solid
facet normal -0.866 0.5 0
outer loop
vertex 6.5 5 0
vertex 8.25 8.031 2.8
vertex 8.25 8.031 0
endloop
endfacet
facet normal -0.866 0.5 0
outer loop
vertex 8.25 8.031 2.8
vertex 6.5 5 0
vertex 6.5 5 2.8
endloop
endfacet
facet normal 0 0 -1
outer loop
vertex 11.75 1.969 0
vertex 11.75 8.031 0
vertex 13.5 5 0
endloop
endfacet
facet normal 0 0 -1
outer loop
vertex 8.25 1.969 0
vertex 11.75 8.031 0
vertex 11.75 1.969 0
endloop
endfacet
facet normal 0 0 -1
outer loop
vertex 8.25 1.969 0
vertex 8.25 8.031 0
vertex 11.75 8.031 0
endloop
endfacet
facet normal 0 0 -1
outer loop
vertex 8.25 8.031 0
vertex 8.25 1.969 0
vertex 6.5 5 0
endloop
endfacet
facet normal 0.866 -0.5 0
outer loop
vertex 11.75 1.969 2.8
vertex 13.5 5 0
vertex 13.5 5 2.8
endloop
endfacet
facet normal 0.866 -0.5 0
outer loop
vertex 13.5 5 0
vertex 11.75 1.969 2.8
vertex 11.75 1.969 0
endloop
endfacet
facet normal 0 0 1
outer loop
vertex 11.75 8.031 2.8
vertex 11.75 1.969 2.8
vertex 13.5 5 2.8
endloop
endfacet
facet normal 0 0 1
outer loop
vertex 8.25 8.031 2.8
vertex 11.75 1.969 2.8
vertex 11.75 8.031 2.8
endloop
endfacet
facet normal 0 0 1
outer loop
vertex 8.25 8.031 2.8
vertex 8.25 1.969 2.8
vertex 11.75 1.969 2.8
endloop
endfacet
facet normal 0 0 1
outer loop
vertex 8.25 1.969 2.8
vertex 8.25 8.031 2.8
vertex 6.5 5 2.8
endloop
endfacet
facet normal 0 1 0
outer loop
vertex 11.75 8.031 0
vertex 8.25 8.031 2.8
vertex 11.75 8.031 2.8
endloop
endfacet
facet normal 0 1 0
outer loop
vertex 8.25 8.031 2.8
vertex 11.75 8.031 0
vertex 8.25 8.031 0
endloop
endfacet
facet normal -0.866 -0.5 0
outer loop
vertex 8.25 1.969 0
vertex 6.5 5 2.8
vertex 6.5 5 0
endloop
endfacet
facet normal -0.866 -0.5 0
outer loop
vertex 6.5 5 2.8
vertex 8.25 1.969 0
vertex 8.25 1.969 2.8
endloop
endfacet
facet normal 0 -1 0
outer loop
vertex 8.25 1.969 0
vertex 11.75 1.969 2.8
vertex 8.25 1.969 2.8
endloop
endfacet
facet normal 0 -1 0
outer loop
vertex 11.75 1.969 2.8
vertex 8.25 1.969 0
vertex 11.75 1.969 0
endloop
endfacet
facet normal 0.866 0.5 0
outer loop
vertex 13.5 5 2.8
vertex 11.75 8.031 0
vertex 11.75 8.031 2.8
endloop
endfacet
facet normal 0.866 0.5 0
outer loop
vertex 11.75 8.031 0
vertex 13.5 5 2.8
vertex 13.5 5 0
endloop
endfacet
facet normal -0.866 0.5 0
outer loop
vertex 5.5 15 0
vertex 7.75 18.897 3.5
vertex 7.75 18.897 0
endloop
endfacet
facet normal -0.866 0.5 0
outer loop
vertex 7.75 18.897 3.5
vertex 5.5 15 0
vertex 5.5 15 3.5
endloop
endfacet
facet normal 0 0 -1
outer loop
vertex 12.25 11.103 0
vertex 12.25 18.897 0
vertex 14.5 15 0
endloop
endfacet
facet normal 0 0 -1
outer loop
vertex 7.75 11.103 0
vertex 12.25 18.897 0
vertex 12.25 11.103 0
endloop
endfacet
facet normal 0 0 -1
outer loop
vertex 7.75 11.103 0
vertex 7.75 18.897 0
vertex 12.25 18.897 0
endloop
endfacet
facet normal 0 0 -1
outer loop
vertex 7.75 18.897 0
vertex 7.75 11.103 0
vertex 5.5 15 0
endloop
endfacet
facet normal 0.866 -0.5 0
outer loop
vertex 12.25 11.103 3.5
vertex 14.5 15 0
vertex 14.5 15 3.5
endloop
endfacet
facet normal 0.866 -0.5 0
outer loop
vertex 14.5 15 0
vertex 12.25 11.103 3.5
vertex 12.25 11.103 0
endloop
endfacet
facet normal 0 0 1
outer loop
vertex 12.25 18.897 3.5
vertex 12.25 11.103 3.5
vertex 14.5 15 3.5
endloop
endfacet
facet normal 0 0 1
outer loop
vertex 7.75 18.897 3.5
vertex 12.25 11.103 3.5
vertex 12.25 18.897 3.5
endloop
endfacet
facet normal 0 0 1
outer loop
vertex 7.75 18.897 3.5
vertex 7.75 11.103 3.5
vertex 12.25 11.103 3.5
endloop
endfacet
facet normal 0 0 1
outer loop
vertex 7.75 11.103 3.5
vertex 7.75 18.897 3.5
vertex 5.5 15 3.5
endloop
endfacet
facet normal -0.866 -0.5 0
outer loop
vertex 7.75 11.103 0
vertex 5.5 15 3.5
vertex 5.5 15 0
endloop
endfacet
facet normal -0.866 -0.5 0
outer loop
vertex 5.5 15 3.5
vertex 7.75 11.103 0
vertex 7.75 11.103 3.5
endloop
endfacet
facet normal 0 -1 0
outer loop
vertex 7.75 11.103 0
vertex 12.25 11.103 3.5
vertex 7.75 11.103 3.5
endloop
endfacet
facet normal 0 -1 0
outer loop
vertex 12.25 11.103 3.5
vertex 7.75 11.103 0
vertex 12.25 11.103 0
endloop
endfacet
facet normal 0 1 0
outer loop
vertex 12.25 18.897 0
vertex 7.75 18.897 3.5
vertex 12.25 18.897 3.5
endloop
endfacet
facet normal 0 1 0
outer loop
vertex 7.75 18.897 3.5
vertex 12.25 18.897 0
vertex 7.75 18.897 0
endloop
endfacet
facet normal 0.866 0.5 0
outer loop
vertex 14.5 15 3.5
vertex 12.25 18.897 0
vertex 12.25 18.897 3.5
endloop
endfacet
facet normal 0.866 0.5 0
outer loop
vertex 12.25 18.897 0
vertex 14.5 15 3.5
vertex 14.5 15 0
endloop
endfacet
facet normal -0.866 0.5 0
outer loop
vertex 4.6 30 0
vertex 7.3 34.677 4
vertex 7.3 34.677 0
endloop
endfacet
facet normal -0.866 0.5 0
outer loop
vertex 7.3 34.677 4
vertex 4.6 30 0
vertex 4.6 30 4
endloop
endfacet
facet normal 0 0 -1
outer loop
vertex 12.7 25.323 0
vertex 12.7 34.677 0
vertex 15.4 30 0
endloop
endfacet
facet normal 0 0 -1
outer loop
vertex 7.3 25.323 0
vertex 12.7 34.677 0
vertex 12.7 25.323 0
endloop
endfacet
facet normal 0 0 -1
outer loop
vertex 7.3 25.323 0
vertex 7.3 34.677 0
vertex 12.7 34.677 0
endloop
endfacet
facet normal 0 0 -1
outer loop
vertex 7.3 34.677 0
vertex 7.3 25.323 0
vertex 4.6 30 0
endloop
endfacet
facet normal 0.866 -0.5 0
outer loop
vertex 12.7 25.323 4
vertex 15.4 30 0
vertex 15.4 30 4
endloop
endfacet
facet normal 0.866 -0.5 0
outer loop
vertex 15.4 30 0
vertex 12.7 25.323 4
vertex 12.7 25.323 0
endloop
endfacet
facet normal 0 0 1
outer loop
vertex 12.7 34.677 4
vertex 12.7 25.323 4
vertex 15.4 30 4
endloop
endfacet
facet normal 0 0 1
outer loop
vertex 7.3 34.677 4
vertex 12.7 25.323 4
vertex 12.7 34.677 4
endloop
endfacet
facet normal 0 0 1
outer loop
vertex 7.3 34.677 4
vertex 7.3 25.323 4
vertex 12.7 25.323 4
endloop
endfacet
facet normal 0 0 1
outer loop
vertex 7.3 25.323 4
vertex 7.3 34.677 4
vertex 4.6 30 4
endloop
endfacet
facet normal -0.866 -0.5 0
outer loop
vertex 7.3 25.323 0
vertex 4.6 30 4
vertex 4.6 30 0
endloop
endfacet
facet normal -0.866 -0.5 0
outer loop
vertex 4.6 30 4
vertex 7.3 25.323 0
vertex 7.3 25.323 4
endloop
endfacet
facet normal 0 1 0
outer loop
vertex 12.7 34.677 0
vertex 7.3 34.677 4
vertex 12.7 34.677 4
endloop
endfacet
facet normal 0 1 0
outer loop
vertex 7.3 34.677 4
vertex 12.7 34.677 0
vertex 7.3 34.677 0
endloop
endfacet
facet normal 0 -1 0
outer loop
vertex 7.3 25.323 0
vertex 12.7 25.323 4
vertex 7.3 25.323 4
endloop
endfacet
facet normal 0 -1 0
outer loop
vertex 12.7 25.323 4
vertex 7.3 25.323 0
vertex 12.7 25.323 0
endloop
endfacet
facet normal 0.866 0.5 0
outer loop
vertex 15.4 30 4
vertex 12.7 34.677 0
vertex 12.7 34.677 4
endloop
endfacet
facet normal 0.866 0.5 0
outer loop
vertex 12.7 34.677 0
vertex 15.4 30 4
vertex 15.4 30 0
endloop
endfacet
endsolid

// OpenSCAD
// nut holes for various nut sizes, centered at 0,0,0
// to use, translate and difference from the base solid.

// By Nenad Rijavec

// Feel free to use, modify and share as you see fit.


// draw a nut hex with the given dimensions. Use directly, or via precooked
// modules for each size.

module draw_nut_hex( r, thickness ) {
	linear_extrude( thickness )
	circle( r, $fn=6  ) ;
}

// modules for various nut sizes
//thickness defaults to the usual nut thickness, but can be changed as
//needed.
module nut_m3( thickness=2.8 ) { draw_nut_hex( 3.5, thickness ) ; }
module nut_m4( thickness=3.5 )  { draw_nut_hex( 4.5, thickness ) ; }
module nut_m5( thickness=4.0 ) { draw_nut_hex( 5.4, thickness ) ; }

//test calls 
translate( [10, 5, 0] ) nut_m3() ;
translate( [10, 15, 0] ) nut_m4() ;
translate( [10, 30, 0] ) nut_m5() ;
